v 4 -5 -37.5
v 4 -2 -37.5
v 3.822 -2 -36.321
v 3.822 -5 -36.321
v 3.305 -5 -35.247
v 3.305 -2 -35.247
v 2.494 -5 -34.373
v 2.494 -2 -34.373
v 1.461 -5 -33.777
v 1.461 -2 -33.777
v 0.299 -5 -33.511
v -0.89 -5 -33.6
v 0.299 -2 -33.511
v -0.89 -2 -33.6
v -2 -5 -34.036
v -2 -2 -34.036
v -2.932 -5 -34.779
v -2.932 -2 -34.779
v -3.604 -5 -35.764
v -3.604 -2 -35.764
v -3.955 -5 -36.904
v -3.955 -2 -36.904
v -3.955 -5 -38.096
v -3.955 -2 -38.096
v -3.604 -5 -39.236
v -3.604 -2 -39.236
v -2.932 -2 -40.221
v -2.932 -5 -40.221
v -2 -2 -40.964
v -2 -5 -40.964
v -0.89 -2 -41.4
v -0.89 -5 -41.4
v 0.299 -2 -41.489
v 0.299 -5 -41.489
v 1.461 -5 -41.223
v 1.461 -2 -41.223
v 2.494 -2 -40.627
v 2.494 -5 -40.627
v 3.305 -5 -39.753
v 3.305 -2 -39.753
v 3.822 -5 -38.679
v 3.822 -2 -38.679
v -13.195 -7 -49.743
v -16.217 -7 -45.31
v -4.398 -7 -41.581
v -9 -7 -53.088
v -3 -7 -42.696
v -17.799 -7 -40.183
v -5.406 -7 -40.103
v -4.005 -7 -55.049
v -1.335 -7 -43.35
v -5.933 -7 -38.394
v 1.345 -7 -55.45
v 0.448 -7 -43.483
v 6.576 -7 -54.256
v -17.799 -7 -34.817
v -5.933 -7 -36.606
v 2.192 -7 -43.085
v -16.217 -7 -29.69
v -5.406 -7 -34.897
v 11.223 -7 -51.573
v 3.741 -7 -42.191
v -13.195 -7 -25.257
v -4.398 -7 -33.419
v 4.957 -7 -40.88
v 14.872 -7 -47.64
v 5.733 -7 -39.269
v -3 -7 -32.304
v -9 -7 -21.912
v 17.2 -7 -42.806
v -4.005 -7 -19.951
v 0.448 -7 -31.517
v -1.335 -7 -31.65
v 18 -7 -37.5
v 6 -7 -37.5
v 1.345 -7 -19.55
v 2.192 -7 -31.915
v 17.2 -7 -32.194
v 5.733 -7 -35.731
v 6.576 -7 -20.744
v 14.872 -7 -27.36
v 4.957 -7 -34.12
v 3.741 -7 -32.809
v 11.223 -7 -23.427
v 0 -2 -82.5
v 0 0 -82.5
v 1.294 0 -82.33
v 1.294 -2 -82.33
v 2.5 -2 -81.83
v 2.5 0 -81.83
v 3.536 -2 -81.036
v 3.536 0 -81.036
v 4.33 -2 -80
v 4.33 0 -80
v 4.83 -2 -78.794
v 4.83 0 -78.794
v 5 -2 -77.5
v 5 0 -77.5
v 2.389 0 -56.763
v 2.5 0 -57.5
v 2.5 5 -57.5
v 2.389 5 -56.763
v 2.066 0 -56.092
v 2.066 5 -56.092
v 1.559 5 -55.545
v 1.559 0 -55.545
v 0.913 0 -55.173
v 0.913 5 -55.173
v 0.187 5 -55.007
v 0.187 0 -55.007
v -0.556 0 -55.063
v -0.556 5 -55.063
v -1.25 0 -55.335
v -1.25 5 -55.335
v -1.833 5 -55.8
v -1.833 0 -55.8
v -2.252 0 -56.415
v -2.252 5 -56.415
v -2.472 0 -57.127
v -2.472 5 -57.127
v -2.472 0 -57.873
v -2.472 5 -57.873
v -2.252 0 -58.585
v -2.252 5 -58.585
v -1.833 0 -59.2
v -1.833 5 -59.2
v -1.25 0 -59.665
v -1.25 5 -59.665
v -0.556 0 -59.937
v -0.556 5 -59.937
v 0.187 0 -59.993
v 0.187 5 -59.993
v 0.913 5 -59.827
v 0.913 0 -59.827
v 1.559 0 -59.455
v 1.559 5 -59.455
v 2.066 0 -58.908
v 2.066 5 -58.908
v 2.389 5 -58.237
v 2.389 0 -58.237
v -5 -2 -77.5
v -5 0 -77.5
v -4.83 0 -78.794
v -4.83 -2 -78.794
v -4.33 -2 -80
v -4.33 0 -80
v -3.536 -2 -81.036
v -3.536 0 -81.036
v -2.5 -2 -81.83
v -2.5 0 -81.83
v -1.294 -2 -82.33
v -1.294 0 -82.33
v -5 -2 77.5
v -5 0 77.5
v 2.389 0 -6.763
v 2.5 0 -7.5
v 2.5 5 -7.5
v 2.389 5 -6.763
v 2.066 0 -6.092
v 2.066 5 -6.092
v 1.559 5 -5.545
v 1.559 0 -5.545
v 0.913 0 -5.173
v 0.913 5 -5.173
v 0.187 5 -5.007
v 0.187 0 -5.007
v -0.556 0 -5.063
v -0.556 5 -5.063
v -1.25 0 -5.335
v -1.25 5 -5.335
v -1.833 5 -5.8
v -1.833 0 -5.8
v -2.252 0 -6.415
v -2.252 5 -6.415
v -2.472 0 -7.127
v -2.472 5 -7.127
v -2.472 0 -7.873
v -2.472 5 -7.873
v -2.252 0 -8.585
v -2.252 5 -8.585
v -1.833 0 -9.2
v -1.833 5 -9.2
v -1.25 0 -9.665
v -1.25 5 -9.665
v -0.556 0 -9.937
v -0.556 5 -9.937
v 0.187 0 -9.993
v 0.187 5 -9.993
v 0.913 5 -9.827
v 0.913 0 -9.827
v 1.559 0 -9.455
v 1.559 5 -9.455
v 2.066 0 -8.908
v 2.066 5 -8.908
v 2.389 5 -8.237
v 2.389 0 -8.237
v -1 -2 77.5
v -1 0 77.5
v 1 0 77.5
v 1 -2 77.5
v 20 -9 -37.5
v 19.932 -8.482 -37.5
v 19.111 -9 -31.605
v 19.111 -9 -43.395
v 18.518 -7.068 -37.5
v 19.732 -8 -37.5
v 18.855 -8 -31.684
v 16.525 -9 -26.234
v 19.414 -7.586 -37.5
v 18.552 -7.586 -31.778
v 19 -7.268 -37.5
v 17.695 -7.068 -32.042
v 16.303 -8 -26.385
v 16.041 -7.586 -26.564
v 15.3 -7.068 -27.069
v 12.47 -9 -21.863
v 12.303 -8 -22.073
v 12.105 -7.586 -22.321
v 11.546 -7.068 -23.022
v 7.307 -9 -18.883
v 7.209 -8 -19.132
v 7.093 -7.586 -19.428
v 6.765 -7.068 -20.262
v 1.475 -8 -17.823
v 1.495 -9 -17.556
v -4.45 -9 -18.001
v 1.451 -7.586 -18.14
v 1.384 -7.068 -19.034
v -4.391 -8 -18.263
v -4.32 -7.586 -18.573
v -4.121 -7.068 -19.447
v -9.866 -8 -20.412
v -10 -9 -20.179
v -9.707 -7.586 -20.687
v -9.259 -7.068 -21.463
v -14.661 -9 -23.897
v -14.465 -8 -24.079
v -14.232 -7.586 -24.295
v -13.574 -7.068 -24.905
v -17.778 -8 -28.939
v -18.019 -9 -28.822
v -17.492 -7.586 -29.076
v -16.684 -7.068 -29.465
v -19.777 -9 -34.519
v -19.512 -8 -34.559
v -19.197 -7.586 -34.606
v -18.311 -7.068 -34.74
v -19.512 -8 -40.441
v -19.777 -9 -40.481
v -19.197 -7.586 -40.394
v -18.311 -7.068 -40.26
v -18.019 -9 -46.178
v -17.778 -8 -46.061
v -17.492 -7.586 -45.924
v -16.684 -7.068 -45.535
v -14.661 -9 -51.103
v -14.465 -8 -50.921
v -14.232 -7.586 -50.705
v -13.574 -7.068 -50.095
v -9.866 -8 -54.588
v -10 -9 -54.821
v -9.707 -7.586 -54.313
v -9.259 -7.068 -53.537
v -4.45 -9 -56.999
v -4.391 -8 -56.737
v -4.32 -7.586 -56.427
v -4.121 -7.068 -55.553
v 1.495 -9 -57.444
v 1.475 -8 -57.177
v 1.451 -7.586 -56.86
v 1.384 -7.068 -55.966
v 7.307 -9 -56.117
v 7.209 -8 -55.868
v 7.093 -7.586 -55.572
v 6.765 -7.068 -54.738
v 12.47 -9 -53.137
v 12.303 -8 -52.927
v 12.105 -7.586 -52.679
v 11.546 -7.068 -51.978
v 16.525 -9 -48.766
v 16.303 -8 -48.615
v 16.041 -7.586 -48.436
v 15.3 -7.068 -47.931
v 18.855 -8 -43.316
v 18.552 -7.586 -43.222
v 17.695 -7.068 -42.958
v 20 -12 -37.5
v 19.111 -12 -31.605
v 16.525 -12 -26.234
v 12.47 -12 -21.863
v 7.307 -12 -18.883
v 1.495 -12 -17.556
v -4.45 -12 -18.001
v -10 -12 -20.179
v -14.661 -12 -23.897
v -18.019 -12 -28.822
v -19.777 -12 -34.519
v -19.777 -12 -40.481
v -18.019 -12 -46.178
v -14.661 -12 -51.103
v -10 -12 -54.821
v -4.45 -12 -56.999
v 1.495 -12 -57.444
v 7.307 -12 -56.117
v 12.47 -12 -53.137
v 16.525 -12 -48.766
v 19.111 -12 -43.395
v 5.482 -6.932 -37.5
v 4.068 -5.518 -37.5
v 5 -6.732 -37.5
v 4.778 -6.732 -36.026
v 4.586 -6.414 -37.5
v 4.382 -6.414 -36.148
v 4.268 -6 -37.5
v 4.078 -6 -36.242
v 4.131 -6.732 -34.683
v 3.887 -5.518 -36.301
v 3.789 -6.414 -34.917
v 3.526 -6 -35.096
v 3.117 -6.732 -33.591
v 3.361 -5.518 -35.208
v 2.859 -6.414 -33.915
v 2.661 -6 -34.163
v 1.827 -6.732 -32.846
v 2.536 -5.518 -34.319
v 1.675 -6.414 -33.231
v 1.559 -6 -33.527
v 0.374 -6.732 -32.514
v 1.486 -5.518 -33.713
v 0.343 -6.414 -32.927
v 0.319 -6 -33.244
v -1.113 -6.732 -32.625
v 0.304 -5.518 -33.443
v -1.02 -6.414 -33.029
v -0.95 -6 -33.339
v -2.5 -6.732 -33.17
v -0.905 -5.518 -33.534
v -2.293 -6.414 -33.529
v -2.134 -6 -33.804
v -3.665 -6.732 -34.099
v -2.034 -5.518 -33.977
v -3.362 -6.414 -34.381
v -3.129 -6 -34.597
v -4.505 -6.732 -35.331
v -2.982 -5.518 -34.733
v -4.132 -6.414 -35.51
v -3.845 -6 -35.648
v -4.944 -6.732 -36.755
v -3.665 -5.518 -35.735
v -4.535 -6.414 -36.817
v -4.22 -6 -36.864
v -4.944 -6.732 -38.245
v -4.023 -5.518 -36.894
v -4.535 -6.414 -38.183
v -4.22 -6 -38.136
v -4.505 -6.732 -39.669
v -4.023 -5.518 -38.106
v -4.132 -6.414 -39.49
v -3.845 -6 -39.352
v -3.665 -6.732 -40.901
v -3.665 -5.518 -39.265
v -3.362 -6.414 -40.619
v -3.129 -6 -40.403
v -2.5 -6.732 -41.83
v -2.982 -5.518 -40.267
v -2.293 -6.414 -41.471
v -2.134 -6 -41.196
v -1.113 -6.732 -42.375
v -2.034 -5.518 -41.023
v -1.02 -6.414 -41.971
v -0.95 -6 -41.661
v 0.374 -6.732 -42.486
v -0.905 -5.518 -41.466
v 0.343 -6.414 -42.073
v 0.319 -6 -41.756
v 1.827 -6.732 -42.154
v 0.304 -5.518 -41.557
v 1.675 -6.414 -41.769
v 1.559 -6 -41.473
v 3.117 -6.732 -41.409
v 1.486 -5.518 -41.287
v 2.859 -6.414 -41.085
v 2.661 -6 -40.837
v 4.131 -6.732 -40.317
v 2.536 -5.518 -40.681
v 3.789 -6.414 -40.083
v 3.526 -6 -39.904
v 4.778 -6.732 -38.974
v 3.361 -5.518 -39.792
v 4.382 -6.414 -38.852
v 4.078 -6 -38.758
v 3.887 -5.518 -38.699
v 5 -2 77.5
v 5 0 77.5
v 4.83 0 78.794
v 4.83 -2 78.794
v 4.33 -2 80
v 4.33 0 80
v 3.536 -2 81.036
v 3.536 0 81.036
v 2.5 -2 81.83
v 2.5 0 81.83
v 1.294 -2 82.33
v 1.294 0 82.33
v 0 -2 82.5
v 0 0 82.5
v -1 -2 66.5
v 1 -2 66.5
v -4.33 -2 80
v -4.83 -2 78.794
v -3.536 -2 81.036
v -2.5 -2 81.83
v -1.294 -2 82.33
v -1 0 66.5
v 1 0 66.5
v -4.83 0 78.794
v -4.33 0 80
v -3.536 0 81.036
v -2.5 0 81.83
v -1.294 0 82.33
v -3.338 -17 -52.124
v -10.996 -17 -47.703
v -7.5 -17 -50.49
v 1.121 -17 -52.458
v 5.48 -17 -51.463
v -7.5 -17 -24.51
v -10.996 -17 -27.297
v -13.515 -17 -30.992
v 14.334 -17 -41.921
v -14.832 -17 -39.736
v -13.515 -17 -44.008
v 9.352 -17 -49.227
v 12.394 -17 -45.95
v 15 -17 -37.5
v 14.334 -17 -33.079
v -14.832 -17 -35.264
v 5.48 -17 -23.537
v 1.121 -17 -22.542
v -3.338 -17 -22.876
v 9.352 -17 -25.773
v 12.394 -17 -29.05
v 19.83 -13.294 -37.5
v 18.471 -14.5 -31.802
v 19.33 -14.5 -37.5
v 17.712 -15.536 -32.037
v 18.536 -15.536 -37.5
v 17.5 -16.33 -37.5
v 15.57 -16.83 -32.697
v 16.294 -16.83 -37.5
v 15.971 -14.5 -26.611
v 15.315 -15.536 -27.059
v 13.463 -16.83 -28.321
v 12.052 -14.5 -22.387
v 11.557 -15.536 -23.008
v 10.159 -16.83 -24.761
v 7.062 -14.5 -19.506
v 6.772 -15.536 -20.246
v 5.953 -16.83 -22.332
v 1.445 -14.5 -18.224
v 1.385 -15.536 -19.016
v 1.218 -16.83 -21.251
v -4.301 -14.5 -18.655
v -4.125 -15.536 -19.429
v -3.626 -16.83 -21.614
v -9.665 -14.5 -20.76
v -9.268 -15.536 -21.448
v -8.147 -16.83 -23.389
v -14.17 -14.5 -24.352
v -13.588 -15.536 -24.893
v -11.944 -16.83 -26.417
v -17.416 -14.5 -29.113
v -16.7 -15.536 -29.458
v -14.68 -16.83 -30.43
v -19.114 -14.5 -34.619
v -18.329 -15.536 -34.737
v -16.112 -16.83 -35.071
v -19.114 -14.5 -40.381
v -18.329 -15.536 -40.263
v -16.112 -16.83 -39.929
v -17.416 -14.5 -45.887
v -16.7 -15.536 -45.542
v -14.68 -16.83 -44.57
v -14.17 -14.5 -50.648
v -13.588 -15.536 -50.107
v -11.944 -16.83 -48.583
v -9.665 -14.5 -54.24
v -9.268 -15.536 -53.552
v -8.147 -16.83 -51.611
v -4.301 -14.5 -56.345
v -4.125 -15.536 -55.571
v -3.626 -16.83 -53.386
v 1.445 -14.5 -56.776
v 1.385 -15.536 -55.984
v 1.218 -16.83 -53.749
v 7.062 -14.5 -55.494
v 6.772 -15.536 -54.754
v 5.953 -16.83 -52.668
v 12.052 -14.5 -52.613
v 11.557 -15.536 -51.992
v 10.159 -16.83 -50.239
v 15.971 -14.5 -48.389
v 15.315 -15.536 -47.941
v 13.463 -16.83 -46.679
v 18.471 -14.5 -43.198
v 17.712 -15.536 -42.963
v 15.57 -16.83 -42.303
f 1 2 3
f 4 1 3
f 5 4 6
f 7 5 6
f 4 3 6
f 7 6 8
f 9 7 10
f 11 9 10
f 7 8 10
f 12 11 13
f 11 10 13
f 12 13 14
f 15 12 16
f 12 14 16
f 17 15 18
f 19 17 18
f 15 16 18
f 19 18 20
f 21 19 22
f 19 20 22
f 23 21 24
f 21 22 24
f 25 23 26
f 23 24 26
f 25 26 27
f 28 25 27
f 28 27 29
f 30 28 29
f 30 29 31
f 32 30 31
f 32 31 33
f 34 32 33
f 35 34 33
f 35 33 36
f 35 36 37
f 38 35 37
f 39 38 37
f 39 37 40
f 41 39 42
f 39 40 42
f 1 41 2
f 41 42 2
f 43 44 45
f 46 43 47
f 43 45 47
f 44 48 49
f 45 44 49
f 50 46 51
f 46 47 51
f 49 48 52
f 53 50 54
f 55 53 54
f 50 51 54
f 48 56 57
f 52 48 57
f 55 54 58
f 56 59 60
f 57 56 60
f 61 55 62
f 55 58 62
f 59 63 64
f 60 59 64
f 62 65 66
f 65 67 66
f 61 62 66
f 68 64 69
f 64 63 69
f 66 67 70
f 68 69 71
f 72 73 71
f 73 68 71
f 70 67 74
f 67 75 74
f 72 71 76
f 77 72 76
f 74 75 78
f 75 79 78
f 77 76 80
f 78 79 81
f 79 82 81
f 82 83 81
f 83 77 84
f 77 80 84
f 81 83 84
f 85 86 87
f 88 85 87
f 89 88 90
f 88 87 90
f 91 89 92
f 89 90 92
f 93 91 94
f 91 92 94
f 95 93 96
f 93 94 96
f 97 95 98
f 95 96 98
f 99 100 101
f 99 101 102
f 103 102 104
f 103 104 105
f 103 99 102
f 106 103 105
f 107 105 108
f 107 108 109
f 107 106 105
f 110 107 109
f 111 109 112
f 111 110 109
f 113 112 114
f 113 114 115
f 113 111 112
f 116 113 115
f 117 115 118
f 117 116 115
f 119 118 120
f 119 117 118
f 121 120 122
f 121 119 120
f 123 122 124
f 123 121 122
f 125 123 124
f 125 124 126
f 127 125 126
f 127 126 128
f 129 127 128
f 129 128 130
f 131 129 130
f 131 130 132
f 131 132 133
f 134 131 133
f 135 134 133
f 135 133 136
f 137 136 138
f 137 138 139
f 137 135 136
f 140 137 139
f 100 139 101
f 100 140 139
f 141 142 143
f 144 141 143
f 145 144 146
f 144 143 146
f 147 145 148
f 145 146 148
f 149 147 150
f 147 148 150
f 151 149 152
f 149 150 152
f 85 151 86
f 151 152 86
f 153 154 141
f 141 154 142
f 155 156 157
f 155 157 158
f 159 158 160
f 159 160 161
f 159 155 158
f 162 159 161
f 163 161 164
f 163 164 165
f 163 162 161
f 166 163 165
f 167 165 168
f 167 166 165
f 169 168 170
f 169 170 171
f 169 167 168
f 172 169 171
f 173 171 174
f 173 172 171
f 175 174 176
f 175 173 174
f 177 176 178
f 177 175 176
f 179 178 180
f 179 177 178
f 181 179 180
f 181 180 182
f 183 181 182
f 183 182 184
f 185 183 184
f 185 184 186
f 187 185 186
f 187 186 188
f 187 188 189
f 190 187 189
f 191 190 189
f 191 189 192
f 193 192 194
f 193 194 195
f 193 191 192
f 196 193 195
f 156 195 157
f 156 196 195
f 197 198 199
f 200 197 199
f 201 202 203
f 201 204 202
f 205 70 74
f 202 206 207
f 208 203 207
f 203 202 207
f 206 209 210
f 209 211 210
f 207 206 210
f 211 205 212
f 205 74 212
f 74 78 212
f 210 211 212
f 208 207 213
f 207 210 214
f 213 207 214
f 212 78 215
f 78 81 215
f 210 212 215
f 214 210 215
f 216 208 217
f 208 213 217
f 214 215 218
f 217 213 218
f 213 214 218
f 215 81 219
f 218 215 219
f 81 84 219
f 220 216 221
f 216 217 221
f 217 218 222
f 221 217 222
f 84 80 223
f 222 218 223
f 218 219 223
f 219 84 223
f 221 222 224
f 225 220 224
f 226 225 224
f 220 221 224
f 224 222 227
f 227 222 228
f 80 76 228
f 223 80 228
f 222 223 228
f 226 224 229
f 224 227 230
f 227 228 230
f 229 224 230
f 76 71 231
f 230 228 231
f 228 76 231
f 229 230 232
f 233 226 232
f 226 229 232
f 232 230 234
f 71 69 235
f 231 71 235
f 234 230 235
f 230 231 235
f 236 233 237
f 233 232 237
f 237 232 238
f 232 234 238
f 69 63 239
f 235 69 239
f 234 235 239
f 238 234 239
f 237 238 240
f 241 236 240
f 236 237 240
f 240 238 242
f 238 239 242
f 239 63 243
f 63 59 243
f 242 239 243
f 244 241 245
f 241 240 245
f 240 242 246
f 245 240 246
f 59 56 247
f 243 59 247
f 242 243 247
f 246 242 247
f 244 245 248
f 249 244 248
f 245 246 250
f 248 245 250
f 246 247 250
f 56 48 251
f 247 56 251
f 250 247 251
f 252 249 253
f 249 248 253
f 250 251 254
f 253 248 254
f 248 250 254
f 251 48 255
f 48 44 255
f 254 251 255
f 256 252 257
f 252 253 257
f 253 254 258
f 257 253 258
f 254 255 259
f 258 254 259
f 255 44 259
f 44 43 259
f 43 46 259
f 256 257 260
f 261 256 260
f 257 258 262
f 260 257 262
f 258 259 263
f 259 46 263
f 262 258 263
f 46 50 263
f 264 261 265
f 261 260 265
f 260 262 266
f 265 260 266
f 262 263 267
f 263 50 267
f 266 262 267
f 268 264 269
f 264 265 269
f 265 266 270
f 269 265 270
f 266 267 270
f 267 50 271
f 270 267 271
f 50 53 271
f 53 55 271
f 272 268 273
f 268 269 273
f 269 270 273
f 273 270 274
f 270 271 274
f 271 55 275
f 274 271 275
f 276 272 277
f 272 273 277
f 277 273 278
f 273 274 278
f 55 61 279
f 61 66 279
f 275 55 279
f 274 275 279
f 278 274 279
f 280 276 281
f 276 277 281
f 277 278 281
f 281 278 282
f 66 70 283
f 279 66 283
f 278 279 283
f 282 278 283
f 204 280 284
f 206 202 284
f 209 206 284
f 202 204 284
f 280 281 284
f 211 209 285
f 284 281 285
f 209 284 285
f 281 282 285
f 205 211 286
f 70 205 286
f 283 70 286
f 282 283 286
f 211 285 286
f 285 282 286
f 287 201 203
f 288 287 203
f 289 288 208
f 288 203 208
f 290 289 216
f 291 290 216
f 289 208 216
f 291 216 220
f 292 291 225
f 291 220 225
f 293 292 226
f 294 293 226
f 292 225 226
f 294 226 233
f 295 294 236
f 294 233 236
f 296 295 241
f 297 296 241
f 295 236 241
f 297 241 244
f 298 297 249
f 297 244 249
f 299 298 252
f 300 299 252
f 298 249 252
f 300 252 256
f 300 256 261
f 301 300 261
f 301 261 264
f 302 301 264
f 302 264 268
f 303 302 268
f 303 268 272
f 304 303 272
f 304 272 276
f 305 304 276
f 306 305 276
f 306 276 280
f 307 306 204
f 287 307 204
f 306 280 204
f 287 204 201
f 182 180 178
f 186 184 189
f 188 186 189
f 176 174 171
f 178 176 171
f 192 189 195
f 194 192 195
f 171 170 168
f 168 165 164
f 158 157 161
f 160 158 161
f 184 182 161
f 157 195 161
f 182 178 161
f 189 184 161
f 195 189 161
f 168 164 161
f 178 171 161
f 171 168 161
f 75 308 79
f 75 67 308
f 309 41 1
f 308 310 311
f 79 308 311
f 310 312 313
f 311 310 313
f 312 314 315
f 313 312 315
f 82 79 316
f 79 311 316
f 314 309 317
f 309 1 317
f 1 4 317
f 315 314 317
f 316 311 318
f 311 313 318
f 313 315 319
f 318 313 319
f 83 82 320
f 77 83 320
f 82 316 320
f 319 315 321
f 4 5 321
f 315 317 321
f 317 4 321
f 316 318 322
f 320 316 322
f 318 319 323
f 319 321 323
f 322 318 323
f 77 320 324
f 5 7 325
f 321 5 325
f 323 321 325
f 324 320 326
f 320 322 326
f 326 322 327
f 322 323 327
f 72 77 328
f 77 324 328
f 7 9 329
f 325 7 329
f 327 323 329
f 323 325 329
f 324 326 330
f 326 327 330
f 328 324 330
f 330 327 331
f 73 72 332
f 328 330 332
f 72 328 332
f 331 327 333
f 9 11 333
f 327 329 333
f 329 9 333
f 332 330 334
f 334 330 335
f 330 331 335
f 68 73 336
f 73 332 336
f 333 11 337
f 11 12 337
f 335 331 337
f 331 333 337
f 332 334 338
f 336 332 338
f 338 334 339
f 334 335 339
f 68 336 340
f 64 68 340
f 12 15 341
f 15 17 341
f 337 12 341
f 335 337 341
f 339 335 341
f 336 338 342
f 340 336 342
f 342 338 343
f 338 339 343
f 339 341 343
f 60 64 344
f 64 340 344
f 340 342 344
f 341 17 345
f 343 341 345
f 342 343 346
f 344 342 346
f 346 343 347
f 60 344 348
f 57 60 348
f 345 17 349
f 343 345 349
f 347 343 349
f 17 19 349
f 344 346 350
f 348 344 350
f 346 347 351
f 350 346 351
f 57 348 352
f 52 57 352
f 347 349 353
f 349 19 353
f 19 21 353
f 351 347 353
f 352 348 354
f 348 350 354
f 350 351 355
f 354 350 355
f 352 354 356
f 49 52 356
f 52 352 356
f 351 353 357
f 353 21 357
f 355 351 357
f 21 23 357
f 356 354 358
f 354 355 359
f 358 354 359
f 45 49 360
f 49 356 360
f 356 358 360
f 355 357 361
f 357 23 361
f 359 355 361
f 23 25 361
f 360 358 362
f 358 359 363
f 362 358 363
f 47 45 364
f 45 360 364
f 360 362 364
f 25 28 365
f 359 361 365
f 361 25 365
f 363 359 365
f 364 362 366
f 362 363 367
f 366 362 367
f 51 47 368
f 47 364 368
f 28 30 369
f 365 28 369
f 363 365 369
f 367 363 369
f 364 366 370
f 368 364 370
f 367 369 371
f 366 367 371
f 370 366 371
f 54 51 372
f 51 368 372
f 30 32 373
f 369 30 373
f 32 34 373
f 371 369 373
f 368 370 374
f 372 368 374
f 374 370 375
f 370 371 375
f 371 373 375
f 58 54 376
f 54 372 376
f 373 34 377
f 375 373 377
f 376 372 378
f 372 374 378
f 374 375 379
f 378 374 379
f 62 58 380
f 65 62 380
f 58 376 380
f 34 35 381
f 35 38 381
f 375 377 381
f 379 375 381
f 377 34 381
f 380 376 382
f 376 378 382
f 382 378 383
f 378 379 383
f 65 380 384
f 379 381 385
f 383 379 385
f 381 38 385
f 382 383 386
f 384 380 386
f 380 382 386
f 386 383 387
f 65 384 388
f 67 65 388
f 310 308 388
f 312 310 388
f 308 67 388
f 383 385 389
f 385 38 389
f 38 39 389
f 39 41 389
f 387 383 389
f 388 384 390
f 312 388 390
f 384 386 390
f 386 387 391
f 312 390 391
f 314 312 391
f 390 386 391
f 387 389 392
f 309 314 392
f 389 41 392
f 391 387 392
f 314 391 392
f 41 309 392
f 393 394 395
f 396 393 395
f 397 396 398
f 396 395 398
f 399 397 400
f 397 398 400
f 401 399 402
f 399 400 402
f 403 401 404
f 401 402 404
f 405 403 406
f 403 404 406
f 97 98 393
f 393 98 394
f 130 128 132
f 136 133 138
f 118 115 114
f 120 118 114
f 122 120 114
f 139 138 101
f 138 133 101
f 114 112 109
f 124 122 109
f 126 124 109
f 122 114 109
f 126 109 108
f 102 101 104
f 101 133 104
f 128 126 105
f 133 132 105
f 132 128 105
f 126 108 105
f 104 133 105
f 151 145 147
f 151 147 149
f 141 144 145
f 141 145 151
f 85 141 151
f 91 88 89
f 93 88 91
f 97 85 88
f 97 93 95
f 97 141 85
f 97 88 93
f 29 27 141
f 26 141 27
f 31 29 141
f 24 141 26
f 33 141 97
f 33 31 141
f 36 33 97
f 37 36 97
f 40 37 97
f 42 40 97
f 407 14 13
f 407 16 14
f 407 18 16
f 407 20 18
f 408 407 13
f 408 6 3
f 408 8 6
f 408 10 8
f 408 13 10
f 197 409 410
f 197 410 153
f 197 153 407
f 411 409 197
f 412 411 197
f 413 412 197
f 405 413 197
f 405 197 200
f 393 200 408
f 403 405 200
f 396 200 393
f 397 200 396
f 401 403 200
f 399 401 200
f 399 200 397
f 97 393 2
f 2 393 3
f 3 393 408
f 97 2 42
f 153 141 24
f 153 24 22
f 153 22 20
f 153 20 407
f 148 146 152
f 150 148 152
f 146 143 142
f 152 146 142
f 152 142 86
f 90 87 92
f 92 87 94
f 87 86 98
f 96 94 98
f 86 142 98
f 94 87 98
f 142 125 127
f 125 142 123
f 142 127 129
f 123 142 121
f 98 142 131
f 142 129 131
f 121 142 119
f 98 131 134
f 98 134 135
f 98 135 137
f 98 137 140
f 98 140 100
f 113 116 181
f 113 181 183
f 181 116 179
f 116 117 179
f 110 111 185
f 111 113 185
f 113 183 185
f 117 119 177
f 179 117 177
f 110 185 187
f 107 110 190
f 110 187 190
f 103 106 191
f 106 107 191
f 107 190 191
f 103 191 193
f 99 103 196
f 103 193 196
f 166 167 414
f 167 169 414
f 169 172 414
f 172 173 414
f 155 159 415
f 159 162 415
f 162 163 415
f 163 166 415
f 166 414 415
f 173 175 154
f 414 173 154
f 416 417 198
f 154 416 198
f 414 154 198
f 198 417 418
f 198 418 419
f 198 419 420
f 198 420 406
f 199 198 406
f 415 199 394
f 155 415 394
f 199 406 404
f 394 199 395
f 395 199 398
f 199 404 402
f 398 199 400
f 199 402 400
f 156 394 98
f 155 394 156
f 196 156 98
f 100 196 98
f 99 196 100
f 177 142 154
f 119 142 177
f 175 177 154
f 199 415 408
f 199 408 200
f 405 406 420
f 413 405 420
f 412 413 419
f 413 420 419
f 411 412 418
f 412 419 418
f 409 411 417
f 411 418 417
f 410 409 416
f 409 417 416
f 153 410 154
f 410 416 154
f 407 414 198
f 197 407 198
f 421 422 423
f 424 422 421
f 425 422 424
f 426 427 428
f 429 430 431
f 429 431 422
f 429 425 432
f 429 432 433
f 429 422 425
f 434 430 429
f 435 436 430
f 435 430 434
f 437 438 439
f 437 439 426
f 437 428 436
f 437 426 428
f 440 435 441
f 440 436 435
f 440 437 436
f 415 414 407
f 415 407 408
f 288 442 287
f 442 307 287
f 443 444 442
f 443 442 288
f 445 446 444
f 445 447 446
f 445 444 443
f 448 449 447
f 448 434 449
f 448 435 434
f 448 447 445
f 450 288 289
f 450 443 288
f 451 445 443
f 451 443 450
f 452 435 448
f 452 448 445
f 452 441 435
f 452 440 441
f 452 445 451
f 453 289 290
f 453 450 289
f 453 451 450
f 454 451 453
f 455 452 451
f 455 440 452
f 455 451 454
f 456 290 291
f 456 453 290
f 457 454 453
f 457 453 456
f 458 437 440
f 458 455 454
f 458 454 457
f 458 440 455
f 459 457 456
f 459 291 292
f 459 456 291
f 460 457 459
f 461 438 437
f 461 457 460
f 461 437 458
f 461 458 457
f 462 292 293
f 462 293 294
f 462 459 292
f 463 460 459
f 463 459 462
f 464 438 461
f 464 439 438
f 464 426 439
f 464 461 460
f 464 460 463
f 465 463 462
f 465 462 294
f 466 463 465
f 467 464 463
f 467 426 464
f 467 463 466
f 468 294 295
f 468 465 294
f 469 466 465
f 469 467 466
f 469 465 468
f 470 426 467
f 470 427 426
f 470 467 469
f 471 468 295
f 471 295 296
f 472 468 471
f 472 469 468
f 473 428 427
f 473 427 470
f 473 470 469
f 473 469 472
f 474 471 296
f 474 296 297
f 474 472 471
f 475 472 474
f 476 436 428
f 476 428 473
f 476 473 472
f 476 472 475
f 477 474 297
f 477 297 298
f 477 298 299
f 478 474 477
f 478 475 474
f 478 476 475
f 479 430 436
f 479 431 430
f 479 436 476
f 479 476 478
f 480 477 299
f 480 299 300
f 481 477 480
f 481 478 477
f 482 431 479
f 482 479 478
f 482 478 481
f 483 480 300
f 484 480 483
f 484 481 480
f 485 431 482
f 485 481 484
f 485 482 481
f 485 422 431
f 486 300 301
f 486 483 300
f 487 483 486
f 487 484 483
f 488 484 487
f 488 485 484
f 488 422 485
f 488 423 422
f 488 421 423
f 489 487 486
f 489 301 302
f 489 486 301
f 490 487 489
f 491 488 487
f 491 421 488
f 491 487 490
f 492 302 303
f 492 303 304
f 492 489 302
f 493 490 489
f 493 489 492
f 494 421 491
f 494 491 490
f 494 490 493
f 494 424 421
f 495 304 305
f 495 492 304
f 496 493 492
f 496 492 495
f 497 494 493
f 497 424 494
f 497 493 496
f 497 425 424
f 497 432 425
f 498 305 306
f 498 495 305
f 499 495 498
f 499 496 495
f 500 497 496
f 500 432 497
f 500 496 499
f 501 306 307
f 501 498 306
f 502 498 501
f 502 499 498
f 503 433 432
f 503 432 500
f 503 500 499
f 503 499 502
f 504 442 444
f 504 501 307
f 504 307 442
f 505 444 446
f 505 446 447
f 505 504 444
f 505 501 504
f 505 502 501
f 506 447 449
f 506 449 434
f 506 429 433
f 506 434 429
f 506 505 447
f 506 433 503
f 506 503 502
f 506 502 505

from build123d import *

# Parameters (mm, degrees)
F0_R     = 2.5
F0_W     = 2
F0_H     = 11
F1_DEPTH = 2
F2_DEPTH = 5
F3_R     = 4
F4_DEPTH = 5
F5_R     = 20
F5_R_2   = 4
F6_DEPTH = 10
F7_R     = 5
F8_R     = 2


with BuildPart() as f1:
    # F0 (on Front) → F1 (new body)
    with BuildSketch(Plane.XZ):
        with BuildLine():
            Line((5, -77.5), (5, 77.5))
            ThreePointArc((5, 77.5), (3.535534, 81.035534), (0, 82.5))
            ThreePointArc((0, 82.5), (-3.535534, 81.035534), (-5, 77.5))
            Line((-5, 77.5), (-5, -77.5))
            ThreePointArc((-5, -77.5), (-3.535534, -81.035534), (0, -82.5))
            ThreePointArc((0, -82.5), (3.535534, -81.035534), (5, -77.5))
        make_face()
        with Locations((0, -67.5)):
            Circle(F0_R, mode=Mode.SUBTRACT)
        with Locations((0, -57.5)):
            Circle(F0_R, mode=Mode.SUBTRACT)
        with Locations((0, -17.5)):
            Circle(F0_R, mode=Mode.SUBTRACT)
        with Locations((0, -7.5)):
            Circle(F0_R, mode=Mode.SUBTRACT)
        with Locations((0, 72)):
            Rectangle(F0_W, F0_H, mode=Mode.SUBTRACT)
        with Locations((0, -7.5)):
            Circle(F0_R)
        with Locations((0, -17.5)):
            Circle(F0_R)
        with Locations((0, -57.5)):
            Circle(F0_R)
        with Locations((0, -67.5)):
            Circle(F0_R)
    extrude(amount=F1_DEPTH)

    # F0 (on Front) → F2 (join)
    with BuildSketch(Plane.XZ):
        with Locations((0, -7.5)):
            Circle(F0_R)
        with Locations((0, -57.5)):
            Circle(F0_R)
    extrude(amount=-F2_DEPTH)

    # F3 (on face) → F4 (join)
    with BuildSketch(Plane.XZ.offset(2)):
        with Locations((0, -37.5)):
            Circle(F3_R)
    extrude(amount=F4_DEPTH)

    # F5 (on face) → F6 (join)
    with BuildSketch(Plane.XZ.offset(7)):
        with Locations((0, -37.5)):
            Circle(F5_R)
        with Locations((0, -37.5)):
            Circle(F5_R_2)
    extrude(amount=F6_DEPTH)

    # F7
    f7_edges = [f1.edges().sort_by_distance(p)[0] for p in [
        (-20, -17, -37.5),
    ]]
    fillet(f7_edges, radius=F7_R)

    # F8
    f8_edges = [f1.edges().sort_by_distance(p)[0] for p in [
        (-4, -7, -37.5),
        (-20, -7, -37.5),
    ]]
    fillet(f8_edges, radius=F8_R)


solid = f1.part
